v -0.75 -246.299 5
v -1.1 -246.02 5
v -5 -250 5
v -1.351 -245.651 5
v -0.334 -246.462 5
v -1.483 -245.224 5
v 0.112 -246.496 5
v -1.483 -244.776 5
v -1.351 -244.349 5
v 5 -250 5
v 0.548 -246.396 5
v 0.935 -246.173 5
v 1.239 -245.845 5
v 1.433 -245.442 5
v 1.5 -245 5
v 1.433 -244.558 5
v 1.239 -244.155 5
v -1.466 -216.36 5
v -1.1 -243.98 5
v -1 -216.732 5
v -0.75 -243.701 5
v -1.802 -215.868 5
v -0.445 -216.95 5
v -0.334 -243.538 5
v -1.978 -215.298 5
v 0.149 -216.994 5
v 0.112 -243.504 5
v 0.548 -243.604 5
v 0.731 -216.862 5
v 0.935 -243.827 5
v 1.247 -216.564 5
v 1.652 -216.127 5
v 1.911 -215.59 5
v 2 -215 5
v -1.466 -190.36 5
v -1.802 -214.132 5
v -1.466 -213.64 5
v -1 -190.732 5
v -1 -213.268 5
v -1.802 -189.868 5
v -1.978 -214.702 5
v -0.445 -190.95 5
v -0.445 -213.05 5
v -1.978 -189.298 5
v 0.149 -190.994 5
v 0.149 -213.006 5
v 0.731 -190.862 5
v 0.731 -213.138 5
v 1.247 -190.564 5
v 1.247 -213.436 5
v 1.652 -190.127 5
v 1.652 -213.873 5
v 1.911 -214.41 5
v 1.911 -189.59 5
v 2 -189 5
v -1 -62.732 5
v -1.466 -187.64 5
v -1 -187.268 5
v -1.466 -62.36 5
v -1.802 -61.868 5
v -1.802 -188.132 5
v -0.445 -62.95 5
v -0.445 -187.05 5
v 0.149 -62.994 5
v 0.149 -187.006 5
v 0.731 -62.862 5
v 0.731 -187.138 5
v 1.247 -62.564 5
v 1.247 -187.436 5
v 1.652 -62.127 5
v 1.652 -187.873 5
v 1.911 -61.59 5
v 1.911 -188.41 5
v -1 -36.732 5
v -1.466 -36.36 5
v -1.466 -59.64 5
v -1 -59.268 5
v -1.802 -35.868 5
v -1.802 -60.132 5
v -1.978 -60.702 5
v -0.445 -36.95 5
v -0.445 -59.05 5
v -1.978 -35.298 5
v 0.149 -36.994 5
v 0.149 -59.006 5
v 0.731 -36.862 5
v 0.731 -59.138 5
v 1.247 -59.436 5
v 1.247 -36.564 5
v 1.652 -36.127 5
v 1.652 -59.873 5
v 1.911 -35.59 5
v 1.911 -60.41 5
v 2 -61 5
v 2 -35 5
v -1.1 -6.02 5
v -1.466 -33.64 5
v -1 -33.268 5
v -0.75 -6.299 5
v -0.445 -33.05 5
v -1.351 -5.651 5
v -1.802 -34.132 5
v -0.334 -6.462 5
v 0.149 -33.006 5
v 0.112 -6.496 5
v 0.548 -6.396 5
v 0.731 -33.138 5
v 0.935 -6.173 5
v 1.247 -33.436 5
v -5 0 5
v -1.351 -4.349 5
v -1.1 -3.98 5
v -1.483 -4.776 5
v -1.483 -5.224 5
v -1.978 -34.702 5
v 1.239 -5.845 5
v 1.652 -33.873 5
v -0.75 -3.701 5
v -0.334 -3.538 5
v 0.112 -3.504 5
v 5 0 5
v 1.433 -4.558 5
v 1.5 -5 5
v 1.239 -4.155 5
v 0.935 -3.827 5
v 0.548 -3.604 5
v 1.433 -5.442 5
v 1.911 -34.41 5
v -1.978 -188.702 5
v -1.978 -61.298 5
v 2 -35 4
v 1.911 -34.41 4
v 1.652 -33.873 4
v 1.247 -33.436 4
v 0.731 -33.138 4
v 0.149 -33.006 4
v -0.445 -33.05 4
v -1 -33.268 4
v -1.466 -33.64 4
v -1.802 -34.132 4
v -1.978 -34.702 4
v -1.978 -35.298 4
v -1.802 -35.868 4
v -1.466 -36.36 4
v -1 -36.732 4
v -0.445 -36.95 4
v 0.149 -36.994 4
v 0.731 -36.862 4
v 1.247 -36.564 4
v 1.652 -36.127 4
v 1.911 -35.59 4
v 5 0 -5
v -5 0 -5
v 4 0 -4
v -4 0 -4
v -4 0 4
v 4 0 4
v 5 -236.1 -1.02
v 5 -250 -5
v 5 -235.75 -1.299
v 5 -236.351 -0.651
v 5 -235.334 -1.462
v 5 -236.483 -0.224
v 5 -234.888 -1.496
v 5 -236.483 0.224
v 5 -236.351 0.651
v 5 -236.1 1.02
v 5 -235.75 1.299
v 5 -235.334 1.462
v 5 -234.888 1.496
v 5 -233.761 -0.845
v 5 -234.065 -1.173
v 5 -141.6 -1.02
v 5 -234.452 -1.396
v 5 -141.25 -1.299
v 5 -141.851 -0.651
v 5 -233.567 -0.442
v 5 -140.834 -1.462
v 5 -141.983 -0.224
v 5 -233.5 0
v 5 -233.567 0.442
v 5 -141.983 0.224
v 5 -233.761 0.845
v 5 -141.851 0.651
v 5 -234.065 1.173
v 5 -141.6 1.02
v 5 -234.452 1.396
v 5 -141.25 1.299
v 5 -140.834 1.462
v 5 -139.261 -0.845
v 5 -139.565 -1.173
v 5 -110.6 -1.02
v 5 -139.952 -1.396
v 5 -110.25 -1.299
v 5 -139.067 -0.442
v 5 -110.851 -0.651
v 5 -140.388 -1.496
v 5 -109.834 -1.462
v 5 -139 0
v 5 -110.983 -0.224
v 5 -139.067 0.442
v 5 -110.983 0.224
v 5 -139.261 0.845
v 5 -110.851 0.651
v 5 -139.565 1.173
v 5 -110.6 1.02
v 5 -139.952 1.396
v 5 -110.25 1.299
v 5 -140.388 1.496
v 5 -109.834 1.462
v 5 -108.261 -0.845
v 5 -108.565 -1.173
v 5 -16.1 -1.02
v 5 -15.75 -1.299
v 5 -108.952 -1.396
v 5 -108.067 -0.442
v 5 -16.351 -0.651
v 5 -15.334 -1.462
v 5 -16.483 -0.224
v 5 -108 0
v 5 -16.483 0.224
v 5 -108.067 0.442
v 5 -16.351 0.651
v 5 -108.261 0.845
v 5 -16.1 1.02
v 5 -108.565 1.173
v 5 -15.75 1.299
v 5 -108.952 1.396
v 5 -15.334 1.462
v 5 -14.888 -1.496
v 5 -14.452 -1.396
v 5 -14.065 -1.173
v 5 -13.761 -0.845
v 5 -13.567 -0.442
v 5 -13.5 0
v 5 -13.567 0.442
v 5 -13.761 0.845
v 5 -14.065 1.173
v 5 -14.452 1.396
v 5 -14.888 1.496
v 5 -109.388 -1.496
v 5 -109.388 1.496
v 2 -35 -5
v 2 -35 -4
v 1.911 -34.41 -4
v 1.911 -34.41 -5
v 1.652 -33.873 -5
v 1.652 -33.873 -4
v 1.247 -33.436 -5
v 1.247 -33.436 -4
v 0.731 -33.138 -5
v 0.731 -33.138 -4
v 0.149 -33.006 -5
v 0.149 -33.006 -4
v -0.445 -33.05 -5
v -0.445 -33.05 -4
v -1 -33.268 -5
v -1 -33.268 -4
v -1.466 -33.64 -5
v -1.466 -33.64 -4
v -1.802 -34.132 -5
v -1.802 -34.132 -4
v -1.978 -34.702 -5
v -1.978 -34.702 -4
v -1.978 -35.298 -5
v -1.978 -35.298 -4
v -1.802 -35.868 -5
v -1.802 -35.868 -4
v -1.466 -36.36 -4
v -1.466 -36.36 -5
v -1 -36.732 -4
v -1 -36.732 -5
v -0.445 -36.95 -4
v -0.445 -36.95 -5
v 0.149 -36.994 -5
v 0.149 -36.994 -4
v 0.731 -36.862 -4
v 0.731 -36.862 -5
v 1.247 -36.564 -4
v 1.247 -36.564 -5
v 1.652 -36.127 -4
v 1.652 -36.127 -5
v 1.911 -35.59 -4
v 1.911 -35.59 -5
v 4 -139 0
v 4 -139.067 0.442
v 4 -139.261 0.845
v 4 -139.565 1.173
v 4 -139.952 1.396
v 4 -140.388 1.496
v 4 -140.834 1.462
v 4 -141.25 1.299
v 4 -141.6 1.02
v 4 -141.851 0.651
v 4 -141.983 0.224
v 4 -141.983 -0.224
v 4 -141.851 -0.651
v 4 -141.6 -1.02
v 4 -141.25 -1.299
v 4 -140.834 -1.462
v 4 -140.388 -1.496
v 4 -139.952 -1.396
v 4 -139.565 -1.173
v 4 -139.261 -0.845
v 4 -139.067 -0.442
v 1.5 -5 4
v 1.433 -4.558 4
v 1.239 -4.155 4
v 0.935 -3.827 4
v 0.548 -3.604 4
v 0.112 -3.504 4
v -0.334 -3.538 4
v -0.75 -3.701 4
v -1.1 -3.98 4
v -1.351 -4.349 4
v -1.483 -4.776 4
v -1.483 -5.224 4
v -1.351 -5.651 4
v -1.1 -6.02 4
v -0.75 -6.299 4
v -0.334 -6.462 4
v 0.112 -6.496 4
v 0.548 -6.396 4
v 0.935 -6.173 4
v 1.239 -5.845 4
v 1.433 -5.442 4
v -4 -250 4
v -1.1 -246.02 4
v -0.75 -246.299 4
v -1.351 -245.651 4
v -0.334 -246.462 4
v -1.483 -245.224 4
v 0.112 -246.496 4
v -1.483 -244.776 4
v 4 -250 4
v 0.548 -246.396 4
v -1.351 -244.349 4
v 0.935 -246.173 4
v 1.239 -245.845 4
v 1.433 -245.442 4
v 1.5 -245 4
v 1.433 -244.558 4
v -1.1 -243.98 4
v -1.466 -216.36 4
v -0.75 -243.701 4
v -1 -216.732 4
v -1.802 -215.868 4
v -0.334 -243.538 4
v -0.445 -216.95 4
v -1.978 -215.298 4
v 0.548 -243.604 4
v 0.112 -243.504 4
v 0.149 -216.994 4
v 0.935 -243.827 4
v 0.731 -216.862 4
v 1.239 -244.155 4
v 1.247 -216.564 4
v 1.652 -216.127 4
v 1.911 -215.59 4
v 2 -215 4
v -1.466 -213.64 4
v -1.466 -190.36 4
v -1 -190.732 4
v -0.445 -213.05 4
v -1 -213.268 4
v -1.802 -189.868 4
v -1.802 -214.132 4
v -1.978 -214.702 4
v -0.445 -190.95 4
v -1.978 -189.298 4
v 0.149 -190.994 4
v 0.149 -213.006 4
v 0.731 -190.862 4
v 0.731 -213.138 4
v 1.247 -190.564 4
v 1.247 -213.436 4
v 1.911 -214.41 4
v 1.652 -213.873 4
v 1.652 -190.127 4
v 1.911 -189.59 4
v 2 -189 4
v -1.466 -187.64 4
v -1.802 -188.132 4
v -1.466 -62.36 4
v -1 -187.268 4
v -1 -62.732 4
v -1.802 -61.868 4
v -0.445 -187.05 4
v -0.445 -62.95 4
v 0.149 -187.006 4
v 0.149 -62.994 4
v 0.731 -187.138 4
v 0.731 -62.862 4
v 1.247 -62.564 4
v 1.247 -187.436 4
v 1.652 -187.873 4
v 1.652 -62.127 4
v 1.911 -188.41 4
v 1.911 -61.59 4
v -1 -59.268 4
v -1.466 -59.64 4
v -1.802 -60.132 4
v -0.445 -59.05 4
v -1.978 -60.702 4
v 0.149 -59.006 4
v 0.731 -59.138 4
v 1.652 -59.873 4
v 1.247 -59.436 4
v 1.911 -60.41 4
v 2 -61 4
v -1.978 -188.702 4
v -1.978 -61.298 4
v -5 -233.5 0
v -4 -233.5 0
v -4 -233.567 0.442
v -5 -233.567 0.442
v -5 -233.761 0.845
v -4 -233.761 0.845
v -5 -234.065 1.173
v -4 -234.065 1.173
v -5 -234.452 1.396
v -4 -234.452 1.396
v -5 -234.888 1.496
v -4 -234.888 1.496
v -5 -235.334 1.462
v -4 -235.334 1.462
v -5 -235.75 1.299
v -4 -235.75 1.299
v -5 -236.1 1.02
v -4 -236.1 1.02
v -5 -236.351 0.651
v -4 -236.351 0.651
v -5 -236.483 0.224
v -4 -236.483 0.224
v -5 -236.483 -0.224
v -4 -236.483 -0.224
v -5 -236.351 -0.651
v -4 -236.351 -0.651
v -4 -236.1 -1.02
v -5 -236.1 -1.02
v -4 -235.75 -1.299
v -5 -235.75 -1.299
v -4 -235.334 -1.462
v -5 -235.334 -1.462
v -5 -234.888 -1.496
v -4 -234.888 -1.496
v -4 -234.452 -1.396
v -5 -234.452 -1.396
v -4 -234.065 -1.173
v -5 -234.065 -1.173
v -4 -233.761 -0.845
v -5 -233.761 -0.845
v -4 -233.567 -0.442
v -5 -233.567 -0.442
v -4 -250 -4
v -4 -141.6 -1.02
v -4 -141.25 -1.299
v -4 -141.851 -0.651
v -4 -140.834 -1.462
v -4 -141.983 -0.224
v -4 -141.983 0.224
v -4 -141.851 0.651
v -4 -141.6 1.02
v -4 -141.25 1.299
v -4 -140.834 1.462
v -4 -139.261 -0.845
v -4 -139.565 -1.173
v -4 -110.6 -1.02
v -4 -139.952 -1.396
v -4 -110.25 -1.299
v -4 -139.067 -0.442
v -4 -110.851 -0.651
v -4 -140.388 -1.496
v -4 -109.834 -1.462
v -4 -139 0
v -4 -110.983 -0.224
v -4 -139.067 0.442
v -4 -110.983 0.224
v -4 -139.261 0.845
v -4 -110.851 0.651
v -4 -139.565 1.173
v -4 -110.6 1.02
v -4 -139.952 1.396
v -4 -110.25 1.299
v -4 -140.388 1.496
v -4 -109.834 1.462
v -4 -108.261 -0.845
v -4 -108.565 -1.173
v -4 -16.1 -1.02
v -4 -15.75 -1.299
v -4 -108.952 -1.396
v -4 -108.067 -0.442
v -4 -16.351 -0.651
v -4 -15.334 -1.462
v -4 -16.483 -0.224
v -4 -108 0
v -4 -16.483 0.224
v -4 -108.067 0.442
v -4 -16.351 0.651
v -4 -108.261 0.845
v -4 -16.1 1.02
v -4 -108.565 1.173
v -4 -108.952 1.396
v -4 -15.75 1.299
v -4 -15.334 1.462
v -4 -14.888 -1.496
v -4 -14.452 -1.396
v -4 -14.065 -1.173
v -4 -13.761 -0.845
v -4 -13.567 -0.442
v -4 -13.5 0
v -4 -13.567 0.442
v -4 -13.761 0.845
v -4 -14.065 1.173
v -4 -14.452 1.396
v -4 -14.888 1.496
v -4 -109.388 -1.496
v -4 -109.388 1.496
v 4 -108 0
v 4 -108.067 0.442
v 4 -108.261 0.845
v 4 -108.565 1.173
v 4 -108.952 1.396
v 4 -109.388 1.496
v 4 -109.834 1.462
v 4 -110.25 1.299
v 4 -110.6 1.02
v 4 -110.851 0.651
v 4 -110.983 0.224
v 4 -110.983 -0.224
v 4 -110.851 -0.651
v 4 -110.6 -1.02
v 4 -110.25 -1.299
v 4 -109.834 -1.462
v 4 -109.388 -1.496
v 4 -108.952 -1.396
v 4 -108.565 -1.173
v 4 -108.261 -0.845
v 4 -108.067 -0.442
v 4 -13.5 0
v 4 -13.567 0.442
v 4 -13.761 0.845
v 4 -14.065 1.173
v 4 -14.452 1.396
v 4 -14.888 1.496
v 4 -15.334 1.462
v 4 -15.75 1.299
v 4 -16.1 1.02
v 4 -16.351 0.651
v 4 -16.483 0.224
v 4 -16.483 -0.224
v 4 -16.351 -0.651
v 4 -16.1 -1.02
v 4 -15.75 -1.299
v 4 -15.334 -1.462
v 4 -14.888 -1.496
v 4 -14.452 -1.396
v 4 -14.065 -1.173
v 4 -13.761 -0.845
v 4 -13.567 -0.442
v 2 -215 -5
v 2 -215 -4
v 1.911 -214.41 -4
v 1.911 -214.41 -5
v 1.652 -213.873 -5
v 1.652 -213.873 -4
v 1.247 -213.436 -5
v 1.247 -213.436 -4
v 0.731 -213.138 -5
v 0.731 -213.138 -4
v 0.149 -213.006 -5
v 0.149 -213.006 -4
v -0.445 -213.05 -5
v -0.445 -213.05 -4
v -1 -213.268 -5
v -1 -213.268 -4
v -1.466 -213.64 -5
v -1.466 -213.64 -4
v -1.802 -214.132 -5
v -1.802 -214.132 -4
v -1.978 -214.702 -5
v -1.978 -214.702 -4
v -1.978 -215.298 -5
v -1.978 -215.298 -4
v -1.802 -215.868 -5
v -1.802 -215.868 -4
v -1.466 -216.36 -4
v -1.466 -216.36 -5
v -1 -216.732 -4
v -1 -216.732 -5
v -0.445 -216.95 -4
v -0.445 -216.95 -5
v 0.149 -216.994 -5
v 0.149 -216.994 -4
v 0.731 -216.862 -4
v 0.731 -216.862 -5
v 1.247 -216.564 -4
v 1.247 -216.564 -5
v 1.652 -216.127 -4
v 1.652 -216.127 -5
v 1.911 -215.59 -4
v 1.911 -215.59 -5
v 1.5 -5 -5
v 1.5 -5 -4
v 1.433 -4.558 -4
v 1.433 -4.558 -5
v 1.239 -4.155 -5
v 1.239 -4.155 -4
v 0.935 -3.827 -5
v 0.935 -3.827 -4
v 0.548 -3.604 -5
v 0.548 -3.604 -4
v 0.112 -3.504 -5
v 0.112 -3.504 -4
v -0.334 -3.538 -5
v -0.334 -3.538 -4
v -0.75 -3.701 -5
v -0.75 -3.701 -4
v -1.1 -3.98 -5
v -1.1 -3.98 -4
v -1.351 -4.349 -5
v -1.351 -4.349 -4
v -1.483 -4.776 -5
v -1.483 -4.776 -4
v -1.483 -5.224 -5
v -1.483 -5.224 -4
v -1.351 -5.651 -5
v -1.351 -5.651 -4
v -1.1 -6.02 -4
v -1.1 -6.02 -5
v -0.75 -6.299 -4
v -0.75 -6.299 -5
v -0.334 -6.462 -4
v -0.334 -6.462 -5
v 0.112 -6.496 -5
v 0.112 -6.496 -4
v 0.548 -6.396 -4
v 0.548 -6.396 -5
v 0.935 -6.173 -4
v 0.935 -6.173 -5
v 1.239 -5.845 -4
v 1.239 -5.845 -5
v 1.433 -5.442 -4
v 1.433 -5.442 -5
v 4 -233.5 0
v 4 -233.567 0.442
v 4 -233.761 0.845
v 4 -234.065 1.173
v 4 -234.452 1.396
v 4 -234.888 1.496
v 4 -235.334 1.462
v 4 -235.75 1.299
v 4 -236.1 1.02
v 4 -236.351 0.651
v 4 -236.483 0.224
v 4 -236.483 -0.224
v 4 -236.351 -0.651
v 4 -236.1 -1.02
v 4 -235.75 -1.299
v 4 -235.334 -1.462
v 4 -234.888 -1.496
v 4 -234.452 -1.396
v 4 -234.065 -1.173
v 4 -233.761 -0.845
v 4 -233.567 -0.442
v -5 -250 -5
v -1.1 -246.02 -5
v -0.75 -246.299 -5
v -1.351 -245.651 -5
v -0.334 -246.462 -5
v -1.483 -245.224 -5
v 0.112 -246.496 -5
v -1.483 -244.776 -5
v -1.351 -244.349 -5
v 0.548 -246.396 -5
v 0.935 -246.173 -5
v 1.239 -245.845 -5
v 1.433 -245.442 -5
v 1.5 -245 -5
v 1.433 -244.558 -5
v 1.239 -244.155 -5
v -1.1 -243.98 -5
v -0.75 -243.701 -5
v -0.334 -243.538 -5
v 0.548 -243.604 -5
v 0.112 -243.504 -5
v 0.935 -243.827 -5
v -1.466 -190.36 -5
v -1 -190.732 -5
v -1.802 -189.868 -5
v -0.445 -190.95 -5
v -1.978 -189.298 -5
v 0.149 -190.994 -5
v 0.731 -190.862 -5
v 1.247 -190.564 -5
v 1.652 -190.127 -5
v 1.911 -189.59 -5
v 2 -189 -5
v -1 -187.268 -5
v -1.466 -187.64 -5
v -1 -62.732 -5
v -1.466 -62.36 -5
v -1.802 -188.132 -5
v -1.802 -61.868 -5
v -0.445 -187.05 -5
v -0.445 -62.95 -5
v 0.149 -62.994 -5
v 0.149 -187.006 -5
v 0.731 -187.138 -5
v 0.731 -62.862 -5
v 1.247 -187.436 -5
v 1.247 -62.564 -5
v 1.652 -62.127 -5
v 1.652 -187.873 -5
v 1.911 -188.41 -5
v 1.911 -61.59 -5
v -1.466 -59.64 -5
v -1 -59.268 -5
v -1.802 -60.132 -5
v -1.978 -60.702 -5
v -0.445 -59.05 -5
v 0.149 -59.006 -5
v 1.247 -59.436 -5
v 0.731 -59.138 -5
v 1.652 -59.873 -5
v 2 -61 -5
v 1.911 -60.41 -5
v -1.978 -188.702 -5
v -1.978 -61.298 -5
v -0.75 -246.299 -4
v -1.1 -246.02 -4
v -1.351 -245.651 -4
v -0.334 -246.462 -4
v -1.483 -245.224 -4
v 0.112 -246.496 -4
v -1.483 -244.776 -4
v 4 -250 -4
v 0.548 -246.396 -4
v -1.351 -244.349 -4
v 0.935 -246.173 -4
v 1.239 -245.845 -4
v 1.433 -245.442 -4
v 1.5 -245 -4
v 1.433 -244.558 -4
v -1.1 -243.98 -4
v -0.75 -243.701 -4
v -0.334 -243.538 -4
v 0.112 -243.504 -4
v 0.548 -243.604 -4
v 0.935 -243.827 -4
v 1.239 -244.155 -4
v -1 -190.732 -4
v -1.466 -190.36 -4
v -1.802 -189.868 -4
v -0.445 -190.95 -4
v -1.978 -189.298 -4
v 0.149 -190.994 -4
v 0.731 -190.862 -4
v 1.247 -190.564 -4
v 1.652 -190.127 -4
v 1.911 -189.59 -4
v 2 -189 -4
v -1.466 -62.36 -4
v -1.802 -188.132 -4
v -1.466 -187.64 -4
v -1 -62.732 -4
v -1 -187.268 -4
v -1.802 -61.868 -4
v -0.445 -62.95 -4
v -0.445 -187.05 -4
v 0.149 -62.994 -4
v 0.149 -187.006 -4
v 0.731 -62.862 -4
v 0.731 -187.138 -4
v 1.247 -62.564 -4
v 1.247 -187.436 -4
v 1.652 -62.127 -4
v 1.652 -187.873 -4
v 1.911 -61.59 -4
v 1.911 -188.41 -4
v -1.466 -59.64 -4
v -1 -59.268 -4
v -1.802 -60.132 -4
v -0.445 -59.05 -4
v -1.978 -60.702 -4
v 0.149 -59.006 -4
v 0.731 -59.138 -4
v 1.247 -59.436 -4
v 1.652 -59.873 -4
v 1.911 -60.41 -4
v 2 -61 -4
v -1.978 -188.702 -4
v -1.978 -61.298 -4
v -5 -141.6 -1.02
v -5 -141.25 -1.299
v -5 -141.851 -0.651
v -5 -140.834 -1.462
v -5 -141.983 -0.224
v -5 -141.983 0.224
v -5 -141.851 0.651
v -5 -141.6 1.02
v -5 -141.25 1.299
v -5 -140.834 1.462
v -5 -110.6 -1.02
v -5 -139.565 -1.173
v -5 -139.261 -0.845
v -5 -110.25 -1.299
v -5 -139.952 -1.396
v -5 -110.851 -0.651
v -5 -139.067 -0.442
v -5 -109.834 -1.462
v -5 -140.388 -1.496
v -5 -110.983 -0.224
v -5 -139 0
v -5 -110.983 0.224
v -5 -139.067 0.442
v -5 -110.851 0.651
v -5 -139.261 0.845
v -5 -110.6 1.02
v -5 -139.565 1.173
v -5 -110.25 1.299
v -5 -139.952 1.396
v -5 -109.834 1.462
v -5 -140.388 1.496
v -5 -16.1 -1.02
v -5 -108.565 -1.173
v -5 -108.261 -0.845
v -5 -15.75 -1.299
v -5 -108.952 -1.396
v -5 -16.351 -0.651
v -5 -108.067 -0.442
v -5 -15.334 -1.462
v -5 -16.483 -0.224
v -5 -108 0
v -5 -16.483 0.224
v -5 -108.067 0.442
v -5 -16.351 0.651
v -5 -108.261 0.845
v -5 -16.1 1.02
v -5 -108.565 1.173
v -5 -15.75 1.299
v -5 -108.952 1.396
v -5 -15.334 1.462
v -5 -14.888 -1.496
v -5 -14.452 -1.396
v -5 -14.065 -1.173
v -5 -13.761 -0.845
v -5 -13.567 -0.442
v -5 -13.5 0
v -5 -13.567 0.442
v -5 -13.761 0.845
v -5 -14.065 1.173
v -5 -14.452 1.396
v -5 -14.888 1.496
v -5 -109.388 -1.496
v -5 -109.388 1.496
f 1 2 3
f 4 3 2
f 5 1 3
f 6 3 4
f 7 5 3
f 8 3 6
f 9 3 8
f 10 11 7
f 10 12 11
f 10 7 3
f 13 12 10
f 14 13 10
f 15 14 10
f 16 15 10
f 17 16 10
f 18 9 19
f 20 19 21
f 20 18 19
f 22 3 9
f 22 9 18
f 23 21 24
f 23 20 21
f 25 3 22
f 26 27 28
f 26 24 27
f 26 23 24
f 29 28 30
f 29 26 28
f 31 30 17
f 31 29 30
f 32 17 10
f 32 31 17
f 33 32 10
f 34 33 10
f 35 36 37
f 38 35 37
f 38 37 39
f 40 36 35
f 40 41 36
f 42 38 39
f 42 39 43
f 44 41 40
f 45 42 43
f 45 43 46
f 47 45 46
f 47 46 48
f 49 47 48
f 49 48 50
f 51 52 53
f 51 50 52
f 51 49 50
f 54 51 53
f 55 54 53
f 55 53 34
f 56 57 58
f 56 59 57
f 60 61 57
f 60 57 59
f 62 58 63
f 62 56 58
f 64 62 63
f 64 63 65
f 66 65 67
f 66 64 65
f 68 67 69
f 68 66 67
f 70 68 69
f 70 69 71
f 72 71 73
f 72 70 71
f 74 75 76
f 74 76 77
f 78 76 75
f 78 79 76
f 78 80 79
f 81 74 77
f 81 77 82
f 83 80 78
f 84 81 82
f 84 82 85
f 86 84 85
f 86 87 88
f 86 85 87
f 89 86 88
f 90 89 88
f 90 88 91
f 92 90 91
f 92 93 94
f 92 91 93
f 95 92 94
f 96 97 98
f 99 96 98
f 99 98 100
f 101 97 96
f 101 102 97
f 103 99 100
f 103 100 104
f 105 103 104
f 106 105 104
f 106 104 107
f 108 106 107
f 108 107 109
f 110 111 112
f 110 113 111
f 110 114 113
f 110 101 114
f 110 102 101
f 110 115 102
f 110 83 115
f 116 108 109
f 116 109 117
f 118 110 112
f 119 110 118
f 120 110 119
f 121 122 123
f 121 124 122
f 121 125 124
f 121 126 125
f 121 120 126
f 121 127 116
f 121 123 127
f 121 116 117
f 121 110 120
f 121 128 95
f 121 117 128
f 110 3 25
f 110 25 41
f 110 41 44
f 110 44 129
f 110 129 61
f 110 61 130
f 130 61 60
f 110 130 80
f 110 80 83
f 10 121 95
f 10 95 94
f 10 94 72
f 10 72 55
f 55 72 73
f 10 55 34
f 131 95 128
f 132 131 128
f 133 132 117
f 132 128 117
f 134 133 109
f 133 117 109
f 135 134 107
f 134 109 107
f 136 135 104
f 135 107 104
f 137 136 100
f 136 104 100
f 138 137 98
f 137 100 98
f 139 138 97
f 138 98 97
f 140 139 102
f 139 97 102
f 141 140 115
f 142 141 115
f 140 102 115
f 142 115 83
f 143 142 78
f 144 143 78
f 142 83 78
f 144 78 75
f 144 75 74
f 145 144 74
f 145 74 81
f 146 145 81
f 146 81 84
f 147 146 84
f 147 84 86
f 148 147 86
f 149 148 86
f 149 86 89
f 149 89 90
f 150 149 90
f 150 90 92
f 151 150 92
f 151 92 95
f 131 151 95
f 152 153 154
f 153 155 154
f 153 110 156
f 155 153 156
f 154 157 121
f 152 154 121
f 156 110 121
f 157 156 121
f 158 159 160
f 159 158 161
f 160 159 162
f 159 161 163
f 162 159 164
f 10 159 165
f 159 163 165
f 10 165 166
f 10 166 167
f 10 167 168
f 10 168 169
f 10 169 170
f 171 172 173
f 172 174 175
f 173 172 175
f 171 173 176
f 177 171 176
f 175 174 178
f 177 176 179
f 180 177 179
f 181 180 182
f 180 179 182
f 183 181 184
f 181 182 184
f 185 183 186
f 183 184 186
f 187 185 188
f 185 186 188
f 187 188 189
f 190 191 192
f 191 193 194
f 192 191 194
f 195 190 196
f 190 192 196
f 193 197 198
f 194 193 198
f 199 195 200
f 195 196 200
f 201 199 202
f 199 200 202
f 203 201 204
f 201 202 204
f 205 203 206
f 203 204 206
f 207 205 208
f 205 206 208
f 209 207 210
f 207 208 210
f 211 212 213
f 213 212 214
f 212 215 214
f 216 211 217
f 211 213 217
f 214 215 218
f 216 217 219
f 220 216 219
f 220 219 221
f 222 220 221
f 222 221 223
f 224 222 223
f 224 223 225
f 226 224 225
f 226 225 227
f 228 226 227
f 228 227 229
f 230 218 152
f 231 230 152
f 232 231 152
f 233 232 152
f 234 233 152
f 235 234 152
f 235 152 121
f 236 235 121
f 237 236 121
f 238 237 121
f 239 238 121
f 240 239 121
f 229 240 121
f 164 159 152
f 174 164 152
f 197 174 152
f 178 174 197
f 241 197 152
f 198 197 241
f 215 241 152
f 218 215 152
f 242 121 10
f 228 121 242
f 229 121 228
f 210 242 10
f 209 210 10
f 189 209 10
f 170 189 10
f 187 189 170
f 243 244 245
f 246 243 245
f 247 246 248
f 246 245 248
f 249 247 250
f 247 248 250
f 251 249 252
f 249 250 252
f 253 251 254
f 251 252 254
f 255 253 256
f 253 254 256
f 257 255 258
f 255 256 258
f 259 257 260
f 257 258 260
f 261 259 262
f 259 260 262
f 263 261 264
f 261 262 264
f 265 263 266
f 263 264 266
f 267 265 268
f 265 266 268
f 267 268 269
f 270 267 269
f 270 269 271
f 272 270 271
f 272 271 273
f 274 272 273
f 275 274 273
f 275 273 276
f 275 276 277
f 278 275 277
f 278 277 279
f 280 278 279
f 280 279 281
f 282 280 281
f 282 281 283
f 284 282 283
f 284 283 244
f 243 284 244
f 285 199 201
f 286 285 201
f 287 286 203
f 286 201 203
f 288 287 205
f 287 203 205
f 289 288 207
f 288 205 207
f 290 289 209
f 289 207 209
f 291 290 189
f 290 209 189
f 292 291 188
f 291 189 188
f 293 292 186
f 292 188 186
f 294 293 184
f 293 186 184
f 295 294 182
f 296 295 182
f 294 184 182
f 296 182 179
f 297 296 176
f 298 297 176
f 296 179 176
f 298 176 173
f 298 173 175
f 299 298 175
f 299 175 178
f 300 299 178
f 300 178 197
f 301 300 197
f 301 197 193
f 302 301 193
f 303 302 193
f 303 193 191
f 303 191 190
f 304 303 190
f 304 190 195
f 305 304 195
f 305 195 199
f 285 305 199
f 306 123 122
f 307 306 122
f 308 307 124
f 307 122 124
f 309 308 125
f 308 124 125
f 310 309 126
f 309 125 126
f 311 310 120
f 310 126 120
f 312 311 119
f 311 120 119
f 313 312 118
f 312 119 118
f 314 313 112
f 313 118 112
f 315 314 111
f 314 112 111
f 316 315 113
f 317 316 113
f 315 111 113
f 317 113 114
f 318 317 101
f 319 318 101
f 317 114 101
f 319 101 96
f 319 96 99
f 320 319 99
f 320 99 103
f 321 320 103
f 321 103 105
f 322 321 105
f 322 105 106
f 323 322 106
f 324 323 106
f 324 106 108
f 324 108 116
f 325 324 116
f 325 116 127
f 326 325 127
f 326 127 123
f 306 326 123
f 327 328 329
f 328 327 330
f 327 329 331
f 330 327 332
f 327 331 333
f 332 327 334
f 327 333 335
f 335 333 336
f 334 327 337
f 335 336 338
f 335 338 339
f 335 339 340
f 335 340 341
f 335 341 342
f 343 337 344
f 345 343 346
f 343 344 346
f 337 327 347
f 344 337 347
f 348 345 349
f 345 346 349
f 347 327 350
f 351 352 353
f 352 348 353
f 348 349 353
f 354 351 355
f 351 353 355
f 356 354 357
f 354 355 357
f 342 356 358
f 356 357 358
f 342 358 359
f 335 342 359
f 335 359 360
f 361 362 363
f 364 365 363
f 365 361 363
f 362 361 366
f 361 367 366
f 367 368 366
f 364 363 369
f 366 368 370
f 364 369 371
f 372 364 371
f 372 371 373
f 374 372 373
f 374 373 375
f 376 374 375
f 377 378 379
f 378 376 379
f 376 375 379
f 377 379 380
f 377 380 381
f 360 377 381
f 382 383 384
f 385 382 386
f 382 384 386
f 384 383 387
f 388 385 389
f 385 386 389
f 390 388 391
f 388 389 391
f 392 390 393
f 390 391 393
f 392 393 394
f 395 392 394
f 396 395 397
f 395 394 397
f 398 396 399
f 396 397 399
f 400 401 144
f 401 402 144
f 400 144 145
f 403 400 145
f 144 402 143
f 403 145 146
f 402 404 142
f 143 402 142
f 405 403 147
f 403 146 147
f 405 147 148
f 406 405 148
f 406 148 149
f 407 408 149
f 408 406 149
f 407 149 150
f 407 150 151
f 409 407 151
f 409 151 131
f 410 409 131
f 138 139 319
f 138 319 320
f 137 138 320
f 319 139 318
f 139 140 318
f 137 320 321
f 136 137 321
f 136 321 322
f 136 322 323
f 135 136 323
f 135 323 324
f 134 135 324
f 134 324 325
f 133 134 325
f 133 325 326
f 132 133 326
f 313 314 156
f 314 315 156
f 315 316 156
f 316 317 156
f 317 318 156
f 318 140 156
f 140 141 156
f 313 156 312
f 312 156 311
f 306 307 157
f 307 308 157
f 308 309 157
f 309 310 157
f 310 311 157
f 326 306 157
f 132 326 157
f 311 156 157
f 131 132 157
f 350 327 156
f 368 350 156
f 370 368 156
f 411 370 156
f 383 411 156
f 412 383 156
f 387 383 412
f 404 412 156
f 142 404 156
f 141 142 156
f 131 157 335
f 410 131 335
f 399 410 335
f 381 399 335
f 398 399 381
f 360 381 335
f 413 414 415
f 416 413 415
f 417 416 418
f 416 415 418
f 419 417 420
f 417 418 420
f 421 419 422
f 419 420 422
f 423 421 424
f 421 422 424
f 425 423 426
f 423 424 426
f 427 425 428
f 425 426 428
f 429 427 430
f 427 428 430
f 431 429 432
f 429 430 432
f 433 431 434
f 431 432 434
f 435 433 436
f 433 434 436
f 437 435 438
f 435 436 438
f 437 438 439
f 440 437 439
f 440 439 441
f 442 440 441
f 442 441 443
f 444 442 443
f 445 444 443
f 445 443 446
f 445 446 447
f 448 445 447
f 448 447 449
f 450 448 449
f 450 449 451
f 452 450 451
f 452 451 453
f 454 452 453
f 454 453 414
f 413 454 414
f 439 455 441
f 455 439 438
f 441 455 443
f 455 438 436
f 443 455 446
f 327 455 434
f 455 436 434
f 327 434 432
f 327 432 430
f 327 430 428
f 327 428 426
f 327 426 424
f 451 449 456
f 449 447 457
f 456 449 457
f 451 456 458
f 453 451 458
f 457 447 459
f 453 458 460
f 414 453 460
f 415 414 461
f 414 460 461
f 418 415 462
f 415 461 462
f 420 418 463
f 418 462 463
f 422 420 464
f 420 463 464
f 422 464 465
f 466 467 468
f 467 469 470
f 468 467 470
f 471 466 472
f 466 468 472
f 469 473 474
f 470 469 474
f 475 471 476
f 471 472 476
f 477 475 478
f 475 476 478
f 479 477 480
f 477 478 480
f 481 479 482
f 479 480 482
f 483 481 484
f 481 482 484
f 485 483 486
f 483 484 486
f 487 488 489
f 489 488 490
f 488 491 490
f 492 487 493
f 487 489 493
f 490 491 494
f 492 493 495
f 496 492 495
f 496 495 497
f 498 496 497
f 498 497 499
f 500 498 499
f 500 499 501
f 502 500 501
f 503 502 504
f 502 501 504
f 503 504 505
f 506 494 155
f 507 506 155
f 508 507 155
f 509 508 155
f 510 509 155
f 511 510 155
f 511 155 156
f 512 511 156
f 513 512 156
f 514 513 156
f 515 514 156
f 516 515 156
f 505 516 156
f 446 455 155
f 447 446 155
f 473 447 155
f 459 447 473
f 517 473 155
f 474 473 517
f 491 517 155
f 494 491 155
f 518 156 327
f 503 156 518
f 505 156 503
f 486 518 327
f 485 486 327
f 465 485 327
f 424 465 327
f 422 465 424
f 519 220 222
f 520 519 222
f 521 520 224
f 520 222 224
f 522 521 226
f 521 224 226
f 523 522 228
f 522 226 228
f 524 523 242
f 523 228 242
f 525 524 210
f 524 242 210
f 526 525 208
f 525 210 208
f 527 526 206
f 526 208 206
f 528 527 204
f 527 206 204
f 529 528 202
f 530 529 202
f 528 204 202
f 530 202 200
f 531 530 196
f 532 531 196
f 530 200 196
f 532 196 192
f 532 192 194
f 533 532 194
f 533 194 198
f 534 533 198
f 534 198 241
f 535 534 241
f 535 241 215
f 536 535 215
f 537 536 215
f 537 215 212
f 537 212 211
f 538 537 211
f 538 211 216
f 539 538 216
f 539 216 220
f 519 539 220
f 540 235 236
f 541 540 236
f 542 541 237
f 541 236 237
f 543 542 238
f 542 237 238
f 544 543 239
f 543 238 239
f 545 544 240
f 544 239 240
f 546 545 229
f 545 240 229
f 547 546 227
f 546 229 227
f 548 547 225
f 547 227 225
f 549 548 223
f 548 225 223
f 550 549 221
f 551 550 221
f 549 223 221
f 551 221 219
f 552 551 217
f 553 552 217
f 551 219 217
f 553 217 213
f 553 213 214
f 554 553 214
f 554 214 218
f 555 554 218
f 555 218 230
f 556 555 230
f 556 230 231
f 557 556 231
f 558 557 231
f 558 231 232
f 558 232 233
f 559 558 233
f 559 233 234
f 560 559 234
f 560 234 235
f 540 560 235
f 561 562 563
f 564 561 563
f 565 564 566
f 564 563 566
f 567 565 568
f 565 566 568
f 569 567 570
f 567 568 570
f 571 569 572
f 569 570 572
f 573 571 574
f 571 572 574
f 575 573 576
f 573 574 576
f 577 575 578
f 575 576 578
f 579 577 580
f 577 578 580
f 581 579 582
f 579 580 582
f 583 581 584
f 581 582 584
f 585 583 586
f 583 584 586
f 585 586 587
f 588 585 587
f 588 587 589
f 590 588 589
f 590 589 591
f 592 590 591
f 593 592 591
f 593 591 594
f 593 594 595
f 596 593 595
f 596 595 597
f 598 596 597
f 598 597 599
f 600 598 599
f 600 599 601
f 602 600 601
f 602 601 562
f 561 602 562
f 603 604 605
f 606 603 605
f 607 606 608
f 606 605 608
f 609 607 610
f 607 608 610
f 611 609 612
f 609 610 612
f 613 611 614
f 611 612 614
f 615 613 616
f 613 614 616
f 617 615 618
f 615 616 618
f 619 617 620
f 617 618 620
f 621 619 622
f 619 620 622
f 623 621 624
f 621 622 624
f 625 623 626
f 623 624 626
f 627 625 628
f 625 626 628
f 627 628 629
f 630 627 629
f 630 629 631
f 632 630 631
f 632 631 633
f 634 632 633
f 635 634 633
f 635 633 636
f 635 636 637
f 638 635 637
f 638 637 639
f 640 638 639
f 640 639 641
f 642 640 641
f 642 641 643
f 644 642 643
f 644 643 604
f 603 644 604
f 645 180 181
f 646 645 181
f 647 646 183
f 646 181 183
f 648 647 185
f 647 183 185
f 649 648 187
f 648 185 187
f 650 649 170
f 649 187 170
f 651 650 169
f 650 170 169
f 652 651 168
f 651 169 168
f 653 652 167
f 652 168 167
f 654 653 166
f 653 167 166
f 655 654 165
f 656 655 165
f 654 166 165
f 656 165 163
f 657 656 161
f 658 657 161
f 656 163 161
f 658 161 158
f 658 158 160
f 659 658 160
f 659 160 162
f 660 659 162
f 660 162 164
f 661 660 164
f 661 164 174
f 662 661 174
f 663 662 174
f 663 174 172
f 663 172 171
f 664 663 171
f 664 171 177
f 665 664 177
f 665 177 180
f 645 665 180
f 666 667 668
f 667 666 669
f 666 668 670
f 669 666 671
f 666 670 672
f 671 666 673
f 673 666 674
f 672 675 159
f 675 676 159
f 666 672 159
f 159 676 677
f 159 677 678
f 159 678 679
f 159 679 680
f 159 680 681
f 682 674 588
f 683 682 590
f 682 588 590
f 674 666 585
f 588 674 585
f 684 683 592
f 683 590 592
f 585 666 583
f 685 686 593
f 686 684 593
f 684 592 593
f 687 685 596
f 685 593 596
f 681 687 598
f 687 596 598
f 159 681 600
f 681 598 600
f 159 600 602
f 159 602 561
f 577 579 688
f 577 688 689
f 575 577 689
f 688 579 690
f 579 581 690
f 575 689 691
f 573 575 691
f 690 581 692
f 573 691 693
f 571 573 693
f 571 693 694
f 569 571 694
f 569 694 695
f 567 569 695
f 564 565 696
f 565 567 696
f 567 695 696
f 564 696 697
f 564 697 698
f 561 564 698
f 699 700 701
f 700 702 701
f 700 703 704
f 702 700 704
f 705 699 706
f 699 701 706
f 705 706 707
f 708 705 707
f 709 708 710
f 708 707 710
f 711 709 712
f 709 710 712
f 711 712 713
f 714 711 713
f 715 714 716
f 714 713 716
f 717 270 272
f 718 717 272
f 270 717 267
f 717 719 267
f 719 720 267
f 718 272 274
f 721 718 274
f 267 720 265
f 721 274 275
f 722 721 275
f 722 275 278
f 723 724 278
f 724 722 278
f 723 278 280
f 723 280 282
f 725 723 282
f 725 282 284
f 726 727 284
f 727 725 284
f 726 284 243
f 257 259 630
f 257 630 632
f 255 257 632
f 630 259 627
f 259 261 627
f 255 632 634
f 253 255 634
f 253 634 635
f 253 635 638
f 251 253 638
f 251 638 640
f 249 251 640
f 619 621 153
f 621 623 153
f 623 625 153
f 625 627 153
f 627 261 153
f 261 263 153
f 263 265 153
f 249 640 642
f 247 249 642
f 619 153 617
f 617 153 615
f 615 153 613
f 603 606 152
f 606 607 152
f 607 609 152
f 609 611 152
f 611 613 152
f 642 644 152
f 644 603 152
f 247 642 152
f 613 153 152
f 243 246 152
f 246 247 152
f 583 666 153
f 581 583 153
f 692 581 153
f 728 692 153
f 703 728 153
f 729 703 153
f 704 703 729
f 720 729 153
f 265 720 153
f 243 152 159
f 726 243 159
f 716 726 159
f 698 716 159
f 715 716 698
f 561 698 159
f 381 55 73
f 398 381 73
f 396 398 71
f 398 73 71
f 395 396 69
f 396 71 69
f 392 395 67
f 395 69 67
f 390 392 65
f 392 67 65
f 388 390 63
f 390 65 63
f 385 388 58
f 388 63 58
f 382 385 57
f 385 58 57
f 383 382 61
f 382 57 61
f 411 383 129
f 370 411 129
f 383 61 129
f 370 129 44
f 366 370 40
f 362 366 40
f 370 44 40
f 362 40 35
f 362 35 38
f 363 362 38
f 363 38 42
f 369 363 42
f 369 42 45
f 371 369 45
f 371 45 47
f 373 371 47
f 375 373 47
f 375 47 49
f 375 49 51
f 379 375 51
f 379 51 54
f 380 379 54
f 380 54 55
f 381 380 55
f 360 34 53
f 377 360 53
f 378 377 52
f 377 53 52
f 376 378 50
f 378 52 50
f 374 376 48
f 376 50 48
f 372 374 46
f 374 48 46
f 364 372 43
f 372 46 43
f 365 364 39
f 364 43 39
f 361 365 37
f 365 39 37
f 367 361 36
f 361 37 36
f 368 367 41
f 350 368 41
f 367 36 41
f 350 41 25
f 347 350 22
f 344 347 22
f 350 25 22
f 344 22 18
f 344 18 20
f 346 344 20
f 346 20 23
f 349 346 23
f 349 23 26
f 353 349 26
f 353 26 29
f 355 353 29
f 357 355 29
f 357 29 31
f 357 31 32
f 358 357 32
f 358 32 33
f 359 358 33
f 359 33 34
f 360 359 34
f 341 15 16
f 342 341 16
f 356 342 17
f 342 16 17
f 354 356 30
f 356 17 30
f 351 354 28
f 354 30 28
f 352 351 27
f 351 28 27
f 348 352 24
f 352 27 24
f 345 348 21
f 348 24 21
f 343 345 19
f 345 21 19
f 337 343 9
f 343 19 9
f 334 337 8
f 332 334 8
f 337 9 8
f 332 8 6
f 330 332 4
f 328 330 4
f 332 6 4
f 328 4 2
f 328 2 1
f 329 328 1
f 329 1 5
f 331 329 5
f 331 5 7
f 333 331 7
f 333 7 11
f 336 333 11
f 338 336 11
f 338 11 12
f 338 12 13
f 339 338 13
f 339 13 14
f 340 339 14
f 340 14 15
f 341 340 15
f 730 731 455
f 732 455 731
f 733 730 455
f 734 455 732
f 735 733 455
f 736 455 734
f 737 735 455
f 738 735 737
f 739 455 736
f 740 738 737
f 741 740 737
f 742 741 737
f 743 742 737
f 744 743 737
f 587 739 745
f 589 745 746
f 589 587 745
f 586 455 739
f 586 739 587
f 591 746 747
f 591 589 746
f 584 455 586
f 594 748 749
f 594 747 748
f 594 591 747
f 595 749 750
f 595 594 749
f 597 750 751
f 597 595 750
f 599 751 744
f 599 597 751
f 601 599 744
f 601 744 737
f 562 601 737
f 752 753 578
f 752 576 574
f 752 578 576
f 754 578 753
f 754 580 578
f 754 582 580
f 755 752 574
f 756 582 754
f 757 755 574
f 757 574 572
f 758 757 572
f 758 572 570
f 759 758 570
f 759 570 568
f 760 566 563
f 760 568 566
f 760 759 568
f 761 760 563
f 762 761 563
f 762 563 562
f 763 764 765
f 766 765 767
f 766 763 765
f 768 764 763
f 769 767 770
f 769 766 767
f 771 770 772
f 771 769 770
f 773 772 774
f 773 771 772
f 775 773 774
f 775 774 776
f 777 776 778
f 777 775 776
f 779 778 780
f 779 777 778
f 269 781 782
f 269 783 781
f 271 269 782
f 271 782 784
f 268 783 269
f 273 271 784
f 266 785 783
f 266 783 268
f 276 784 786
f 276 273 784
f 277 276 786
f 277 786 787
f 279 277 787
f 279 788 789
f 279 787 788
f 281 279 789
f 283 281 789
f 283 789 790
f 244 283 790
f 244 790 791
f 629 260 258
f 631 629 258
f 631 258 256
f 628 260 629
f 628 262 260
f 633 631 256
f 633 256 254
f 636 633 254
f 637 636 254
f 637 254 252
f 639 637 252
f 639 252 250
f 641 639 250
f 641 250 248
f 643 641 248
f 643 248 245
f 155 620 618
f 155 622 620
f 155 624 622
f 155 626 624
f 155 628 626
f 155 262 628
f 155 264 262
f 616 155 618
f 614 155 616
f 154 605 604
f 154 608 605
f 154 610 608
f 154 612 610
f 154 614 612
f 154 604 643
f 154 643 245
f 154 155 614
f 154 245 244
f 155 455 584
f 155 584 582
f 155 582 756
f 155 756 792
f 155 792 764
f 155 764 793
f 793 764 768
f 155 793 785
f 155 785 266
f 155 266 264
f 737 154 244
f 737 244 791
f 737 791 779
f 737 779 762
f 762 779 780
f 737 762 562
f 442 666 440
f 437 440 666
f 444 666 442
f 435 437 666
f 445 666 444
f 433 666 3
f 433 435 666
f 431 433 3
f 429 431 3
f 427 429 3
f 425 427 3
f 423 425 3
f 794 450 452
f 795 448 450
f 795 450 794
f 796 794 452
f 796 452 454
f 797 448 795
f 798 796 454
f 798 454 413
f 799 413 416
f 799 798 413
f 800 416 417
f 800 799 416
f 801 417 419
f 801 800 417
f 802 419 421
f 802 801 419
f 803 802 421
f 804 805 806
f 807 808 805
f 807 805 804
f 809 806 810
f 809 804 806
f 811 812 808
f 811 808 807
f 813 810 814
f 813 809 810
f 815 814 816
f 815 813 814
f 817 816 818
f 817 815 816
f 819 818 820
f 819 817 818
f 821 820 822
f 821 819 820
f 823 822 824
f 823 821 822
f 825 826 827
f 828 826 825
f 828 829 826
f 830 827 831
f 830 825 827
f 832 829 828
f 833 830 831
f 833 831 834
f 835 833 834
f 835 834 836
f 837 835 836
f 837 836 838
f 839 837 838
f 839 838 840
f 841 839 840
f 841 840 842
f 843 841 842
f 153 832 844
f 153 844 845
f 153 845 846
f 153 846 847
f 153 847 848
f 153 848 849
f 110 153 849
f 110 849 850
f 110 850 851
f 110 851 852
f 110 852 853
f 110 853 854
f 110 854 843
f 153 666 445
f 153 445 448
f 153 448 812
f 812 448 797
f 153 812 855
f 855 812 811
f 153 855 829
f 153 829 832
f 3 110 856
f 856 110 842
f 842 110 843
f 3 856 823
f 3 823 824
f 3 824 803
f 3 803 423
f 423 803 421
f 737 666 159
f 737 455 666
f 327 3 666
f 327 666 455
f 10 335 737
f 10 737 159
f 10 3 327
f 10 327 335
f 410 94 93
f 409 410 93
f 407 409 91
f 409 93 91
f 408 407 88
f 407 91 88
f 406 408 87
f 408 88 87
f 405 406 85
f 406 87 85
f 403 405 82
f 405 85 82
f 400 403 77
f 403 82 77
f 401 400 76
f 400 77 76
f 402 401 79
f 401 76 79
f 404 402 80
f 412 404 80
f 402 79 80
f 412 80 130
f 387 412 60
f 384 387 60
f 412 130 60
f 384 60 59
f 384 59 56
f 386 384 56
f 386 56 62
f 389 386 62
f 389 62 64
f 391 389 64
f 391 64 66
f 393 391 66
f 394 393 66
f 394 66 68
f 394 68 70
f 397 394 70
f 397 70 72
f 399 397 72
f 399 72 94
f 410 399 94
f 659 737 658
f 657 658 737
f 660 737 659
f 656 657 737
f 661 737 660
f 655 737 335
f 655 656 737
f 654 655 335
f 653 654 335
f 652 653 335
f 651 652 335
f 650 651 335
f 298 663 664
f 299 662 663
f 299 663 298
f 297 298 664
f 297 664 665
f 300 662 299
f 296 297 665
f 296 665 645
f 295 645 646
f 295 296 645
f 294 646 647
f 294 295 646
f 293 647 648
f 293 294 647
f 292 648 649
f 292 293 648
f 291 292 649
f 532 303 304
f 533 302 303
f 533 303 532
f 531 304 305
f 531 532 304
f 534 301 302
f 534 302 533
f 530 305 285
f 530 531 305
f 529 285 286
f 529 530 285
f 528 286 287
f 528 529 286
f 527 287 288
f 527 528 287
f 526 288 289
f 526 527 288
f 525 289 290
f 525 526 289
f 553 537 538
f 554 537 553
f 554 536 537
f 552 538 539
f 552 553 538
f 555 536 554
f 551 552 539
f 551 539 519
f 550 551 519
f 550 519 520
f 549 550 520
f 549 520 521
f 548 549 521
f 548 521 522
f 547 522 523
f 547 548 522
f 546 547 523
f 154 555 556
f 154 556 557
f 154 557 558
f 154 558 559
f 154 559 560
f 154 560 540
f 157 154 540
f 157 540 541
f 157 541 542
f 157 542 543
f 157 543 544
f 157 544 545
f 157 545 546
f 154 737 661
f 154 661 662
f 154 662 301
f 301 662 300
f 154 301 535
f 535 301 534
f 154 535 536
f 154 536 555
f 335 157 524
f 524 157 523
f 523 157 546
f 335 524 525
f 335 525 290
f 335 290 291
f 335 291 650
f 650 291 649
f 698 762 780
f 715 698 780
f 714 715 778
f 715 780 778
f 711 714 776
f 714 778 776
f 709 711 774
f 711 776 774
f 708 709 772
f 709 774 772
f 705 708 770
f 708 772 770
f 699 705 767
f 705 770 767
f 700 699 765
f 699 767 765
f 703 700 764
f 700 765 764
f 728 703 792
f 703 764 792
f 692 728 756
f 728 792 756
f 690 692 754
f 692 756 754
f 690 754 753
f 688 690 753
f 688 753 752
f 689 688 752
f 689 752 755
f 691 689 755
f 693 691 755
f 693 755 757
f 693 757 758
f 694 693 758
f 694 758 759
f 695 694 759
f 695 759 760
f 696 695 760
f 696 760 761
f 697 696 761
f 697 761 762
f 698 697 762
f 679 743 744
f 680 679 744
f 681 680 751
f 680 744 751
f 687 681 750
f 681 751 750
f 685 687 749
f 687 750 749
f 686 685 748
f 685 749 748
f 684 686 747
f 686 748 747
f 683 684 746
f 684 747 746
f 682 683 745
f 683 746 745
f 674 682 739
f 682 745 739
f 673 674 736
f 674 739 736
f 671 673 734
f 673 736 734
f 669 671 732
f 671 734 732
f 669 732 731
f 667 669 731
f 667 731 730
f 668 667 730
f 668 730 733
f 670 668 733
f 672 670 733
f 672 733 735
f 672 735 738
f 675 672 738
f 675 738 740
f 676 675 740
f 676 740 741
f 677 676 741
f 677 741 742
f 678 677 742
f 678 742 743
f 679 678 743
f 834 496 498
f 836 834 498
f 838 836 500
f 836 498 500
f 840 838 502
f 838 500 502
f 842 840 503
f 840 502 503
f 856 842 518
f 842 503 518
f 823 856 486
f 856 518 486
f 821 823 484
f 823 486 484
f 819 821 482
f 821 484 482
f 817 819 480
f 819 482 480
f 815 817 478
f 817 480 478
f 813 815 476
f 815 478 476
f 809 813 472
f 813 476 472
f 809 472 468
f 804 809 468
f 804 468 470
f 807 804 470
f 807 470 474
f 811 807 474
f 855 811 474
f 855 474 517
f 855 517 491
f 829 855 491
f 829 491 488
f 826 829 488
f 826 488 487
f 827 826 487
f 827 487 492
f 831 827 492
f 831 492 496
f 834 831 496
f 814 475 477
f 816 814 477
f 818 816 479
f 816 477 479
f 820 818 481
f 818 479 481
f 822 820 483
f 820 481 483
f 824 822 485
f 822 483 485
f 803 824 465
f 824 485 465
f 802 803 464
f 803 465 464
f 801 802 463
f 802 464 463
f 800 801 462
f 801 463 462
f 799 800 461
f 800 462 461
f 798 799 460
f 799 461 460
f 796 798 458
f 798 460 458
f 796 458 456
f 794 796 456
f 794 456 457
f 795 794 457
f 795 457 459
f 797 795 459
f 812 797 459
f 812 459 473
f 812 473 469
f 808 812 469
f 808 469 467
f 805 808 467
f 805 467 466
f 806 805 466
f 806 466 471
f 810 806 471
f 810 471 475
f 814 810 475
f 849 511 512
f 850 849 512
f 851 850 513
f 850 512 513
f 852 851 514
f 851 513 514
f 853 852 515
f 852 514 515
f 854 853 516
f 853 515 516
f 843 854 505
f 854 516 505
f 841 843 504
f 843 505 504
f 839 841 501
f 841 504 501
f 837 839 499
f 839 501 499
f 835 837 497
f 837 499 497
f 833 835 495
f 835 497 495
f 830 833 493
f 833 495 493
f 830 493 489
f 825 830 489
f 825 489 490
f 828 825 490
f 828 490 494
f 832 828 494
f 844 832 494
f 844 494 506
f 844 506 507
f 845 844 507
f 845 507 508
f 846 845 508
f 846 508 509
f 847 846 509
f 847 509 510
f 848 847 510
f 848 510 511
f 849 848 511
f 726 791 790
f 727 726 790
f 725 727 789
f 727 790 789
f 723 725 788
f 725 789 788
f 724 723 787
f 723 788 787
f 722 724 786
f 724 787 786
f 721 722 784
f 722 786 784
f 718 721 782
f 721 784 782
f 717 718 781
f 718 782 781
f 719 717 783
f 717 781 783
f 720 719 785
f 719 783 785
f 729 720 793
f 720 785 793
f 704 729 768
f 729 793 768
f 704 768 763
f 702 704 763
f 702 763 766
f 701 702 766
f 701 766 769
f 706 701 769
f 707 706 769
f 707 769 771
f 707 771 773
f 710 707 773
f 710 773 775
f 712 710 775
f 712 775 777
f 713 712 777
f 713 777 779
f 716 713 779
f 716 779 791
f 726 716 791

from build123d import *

# Parameters (mm, degrees)
F0_W     = 10
F0_H     = 10
F0_W_2   = 8
F0_H_2   = 8
F1_DEPTH = 250
F2_R     = 1.5
F4_DEPTH = 25
F3_R     = 1.5
F3_R_2   = 2
F5_DEPTH = 25


with BuildPart() as f1:
    # F0 (on Front) → F1 (new body)
    with BuildSketch(Plane.XZ):
        Rectangle(F0_W, F0_H)
        Rectangle(F0_W_2, F0_H_2, mode=Mode.SUBTRACT)
    extrude(amount=F1_DEPTH)

    # F2 (on face) → F4 (cut)
    with BuildSketch(Plane.YZ.offset(5)):
        with Locations((-140.5, 0)):
            Circle(F2_R)
        with Locations((-235, 0)):
            Circle(F2_R)
        with Locations((-15, 0)):
            Circle(F2_R)
        with Locations((-109.5, 0)):
            Circle(F2_R)
    extrude(amount=-F4_DEPTH, mode=Mode.SUBTRACT)

    # F3 (on face) → F5 (cut)
    with BuildSketch(Plane.XY.offset(5)):
        with Locations((0, -245)):
            Circle(F3_R)
        with Locations((0, -215)):
            Circle(F3_R_2)
        with Locations((0, -189)):
            Circle(F3_R_2)
        with Locations((0, -61)):
            Circle(F3_R_2)
        with Locations((0, -35)):
            Circle(F3_R_2)
        with Locations((0, -5)):
            Circle(F3_R)
    extrude(amount=-F5_DEPTH, mode=Mode.SUBTRACT)


solid = f1.part
